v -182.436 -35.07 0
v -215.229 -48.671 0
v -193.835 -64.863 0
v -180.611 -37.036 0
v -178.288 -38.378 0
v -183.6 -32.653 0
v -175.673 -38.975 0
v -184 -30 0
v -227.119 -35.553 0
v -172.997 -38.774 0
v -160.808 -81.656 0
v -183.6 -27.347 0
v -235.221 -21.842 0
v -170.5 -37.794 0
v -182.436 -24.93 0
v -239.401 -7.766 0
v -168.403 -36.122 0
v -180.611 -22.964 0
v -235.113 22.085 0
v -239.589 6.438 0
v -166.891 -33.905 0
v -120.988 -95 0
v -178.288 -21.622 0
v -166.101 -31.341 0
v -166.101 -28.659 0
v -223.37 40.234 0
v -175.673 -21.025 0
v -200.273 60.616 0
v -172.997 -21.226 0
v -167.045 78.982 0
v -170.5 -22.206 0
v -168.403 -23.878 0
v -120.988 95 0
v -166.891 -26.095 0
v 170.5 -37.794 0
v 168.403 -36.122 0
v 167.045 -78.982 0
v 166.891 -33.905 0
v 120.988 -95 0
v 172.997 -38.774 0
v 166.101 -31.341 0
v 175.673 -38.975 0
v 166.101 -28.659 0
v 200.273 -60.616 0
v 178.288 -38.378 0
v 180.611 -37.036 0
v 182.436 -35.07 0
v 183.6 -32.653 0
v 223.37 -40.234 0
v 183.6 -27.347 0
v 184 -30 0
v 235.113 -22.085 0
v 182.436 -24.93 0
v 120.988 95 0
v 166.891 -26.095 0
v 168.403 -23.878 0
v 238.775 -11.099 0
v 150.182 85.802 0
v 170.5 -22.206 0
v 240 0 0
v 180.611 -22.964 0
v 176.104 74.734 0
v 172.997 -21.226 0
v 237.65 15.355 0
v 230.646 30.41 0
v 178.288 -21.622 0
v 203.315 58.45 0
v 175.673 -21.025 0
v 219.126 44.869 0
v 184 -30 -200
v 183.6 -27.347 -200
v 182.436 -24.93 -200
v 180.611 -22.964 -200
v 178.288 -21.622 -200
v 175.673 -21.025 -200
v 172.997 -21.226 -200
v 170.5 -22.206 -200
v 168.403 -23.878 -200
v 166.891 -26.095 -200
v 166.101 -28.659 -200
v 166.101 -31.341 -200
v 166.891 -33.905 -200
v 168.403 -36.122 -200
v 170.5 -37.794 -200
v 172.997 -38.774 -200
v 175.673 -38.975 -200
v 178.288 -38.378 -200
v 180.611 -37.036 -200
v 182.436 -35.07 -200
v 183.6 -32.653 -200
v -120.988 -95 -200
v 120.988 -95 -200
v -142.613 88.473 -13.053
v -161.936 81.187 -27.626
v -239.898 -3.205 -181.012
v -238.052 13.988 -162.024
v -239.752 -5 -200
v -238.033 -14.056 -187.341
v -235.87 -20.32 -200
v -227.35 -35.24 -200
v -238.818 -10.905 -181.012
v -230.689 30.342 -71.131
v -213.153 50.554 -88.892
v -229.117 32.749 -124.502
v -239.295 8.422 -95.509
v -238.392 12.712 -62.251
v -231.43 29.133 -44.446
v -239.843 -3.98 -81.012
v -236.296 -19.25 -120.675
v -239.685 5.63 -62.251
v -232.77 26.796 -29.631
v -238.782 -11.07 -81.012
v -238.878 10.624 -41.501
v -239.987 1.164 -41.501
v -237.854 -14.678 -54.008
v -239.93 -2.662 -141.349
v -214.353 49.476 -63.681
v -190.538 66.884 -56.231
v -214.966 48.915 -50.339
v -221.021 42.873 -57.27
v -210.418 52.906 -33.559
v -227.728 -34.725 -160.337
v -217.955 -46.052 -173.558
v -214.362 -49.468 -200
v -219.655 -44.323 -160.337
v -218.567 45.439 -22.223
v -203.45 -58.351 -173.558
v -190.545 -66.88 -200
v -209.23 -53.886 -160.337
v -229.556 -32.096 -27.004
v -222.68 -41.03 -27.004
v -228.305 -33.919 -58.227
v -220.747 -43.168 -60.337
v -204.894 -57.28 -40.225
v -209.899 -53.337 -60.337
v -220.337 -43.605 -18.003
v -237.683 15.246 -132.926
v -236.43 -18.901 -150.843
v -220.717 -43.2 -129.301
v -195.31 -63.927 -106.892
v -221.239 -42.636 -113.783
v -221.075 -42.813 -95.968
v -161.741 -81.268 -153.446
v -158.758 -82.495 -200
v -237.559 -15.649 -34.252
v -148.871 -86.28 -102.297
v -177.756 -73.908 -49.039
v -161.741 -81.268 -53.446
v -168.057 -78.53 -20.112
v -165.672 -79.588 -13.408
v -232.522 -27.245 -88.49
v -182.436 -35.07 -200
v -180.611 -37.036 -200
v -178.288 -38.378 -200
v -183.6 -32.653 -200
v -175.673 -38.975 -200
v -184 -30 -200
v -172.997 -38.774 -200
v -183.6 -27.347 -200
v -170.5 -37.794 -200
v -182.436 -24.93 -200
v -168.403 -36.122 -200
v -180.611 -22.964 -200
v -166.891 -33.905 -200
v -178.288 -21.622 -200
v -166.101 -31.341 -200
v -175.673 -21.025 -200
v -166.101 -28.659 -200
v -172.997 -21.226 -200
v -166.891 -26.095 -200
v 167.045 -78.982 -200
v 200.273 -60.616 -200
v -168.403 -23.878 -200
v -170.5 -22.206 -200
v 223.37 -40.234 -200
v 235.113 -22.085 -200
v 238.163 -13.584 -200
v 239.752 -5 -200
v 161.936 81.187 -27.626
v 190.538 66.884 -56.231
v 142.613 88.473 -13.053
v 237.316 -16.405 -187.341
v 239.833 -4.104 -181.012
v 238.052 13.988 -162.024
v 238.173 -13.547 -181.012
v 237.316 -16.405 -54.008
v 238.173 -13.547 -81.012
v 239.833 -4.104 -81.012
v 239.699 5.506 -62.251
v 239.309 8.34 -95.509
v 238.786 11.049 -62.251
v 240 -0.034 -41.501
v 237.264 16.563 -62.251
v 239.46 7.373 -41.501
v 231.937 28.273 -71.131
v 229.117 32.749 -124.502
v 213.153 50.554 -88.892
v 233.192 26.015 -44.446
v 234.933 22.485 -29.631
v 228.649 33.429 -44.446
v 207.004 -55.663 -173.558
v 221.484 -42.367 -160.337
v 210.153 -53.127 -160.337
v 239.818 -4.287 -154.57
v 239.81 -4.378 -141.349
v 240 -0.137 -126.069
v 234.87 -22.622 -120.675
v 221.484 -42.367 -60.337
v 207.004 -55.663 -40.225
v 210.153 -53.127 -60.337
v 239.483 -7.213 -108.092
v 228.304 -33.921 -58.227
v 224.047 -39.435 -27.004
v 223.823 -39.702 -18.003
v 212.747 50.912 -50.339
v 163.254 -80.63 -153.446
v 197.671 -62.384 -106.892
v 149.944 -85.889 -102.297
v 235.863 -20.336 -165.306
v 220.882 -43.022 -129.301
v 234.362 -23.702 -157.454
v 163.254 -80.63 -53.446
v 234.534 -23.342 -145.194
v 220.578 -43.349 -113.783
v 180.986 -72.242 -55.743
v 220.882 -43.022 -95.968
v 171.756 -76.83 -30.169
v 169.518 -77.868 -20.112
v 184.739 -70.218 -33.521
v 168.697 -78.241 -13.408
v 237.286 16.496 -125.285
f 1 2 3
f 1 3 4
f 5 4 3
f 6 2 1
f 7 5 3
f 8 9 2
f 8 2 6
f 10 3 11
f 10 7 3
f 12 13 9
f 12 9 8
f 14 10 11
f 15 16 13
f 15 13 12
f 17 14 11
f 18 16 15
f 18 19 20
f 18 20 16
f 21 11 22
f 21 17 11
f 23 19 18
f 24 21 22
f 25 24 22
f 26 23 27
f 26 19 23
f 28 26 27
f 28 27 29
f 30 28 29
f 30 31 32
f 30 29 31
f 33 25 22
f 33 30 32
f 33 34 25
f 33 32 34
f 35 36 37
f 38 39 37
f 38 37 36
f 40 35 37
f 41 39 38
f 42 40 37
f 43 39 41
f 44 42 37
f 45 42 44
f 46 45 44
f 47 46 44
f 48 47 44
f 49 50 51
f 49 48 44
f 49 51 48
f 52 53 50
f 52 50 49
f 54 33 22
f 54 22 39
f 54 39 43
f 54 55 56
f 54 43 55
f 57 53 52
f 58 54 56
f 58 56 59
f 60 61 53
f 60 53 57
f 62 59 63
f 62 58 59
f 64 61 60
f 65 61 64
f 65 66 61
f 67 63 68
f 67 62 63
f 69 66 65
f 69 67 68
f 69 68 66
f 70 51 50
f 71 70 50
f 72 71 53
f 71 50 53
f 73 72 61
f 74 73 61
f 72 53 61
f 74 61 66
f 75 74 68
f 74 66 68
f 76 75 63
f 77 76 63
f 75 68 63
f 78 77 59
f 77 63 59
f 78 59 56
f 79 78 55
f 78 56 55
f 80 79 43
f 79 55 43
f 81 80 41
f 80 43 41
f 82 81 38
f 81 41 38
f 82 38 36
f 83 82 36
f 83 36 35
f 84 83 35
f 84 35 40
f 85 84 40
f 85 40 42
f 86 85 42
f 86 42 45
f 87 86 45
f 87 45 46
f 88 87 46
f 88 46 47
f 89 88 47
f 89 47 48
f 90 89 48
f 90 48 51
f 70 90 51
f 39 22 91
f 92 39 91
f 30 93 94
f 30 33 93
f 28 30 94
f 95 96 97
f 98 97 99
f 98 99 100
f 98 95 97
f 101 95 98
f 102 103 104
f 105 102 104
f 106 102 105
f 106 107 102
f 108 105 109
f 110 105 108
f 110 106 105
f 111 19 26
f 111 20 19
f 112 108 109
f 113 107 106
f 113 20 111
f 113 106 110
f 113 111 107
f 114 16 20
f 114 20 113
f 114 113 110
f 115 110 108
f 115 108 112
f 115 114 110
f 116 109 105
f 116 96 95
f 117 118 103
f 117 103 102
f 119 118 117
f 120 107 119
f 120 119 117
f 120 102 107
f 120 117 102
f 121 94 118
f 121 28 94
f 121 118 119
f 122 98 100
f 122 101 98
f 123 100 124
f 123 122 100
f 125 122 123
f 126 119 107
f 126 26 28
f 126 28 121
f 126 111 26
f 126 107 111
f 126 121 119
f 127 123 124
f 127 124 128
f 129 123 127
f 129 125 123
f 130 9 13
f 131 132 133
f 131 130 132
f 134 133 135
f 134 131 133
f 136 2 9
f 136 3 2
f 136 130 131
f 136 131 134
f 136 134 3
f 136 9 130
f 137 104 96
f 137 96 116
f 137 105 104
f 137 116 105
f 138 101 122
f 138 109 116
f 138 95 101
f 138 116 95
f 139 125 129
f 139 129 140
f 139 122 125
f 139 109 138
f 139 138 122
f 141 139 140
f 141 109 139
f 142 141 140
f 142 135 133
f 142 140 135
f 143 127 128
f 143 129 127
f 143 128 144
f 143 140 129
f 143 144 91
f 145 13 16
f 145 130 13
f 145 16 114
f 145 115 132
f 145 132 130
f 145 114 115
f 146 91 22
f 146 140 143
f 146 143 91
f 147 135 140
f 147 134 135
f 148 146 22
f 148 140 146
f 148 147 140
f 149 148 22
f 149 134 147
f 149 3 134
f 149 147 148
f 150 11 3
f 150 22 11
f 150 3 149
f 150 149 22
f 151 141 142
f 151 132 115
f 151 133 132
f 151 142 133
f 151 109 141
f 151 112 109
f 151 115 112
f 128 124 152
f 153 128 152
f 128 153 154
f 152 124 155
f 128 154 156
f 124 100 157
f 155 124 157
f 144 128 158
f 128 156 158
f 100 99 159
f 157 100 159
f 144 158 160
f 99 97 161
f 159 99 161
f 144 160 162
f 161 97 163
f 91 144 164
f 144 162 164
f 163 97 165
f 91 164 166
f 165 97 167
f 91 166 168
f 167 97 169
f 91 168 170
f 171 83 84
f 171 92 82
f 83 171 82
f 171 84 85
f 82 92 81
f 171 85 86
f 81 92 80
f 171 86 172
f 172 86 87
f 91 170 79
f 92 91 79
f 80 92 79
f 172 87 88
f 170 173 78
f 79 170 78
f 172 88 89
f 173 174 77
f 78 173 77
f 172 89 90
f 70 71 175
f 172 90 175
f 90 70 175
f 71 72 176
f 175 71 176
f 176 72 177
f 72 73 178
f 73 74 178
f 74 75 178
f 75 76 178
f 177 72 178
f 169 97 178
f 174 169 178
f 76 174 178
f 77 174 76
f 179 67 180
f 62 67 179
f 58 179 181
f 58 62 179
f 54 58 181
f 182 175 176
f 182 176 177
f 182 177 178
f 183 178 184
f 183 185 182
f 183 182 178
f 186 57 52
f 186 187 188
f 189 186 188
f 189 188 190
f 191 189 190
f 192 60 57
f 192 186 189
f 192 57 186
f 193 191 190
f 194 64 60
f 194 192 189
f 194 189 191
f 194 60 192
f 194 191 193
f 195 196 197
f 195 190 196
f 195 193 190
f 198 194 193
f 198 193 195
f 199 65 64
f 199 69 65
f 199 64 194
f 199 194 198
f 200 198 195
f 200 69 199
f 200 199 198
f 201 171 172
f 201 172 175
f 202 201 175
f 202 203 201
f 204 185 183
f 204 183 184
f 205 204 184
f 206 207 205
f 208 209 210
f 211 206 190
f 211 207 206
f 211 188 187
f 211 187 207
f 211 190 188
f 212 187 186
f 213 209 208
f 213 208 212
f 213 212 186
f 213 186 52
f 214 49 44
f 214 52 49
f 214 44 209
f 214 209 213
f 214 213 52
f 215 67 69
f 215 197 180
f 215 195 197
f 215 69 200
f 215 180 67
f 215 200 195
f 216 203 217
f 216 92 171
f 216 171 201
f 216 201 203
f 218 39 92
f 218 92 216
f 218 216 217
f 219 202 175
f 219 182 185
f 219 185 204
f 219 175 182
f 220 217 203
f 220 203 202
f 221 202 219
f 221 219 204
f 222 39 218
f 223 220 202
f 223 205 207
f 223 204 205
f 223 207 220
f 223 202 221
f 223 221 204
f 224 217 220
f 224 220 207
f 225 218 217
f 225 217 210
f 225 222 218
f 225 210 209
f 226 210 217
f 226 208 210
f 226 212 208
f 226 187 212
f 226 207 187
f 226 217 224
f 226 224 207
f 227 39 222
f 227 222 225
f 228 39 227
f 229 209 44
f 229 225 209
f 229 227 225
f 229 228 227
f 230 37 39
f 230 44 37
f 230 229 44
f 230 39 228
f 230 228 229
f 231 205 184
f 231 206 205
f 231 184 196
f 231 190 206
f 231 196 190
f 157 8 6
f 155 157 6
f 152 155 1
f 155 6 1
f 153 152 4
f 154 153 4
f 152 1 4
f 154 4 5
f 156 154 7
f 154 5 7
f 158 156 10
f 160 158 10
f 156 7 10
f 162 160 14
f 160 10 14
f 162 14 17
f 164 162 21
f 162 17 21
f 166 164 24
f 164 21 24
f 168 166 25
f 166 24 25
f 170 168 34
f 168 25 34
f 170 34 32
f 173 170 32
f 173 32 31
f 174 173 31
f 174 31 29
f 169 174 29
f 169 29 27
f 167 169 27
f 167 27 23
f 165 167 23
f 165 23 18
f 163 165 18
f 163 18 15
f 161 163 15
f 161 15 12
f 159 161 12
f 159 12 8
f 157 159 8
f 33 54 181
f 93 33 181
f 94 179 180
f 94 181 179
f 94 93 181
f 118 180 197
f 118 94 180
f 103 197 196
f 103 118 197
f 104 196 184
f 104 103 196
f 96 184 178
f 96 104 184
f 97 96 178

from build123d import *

# Parameters (mm, degrees)
SKETCH1_RX               = 240
SKETCH1_RY               = 110
BOSS_EXTRUDE1_DEPTH      = 200
SKETCH12_R               = 9
CUT_EXTRUDE8_DEPTH       = 332.209903234
CUT_EXTRUDE10_DEPTH      = 332.209903234
CUT_EXTRUDE10_DEPTH_BACK = 332.209903234
SKETCH15_W               = 200
SKETCH15_H               = 15


with BuildPart() as part:
    # Sketch1 → Boss-Extrude1 (new body)
    with BuildSketch(Plane.XY):
        with Locations((0, 0)):
            Ellipse(SKETCH1_RX, SKETCH1_RY)
    extrude(amount=-BOSS_EXTRUDE1_DEPTH)

    # Sketch12 → Cut-Extrude8 (cut, through all)
    with BuildSketch(Plane.XY):
        with Locations((175, -30)):
            Circle(SKETCH12_R)
        with Locations(Location((-175, -30, 0), (0, 0, 180))):
            Circle(SKETCH12_R)
    extrude(amount=-CUT_EXTRUDE8_DEPTH, mode=Mode.SUBTRACT)

    # Sketch15 → Cut-Extrude10 (cut, two sides: drawn at the far end of the back side and taken through both)
    with BuildSketch(Plane(origin=(0, 0, 0), x_dir=(0, 0, -1), z_dir=(1, 0, 0)).offset(-CUT_EXTRUDE10_DEPTH_BACK)):
        Polygon((0, 110), (0, 95), (200, -5), (200, 110), align=None)
        with Locations((100, -102.5)):
            Rectangle(SKETCH15_W, SKETCH15_H)
    extrude(amount=CUT_EXTRUDE10_DEPTH + CUT_EXTRUDE10_DEPTH_BACK, mode=Mode.SUBTRACT)


solid = part.part
